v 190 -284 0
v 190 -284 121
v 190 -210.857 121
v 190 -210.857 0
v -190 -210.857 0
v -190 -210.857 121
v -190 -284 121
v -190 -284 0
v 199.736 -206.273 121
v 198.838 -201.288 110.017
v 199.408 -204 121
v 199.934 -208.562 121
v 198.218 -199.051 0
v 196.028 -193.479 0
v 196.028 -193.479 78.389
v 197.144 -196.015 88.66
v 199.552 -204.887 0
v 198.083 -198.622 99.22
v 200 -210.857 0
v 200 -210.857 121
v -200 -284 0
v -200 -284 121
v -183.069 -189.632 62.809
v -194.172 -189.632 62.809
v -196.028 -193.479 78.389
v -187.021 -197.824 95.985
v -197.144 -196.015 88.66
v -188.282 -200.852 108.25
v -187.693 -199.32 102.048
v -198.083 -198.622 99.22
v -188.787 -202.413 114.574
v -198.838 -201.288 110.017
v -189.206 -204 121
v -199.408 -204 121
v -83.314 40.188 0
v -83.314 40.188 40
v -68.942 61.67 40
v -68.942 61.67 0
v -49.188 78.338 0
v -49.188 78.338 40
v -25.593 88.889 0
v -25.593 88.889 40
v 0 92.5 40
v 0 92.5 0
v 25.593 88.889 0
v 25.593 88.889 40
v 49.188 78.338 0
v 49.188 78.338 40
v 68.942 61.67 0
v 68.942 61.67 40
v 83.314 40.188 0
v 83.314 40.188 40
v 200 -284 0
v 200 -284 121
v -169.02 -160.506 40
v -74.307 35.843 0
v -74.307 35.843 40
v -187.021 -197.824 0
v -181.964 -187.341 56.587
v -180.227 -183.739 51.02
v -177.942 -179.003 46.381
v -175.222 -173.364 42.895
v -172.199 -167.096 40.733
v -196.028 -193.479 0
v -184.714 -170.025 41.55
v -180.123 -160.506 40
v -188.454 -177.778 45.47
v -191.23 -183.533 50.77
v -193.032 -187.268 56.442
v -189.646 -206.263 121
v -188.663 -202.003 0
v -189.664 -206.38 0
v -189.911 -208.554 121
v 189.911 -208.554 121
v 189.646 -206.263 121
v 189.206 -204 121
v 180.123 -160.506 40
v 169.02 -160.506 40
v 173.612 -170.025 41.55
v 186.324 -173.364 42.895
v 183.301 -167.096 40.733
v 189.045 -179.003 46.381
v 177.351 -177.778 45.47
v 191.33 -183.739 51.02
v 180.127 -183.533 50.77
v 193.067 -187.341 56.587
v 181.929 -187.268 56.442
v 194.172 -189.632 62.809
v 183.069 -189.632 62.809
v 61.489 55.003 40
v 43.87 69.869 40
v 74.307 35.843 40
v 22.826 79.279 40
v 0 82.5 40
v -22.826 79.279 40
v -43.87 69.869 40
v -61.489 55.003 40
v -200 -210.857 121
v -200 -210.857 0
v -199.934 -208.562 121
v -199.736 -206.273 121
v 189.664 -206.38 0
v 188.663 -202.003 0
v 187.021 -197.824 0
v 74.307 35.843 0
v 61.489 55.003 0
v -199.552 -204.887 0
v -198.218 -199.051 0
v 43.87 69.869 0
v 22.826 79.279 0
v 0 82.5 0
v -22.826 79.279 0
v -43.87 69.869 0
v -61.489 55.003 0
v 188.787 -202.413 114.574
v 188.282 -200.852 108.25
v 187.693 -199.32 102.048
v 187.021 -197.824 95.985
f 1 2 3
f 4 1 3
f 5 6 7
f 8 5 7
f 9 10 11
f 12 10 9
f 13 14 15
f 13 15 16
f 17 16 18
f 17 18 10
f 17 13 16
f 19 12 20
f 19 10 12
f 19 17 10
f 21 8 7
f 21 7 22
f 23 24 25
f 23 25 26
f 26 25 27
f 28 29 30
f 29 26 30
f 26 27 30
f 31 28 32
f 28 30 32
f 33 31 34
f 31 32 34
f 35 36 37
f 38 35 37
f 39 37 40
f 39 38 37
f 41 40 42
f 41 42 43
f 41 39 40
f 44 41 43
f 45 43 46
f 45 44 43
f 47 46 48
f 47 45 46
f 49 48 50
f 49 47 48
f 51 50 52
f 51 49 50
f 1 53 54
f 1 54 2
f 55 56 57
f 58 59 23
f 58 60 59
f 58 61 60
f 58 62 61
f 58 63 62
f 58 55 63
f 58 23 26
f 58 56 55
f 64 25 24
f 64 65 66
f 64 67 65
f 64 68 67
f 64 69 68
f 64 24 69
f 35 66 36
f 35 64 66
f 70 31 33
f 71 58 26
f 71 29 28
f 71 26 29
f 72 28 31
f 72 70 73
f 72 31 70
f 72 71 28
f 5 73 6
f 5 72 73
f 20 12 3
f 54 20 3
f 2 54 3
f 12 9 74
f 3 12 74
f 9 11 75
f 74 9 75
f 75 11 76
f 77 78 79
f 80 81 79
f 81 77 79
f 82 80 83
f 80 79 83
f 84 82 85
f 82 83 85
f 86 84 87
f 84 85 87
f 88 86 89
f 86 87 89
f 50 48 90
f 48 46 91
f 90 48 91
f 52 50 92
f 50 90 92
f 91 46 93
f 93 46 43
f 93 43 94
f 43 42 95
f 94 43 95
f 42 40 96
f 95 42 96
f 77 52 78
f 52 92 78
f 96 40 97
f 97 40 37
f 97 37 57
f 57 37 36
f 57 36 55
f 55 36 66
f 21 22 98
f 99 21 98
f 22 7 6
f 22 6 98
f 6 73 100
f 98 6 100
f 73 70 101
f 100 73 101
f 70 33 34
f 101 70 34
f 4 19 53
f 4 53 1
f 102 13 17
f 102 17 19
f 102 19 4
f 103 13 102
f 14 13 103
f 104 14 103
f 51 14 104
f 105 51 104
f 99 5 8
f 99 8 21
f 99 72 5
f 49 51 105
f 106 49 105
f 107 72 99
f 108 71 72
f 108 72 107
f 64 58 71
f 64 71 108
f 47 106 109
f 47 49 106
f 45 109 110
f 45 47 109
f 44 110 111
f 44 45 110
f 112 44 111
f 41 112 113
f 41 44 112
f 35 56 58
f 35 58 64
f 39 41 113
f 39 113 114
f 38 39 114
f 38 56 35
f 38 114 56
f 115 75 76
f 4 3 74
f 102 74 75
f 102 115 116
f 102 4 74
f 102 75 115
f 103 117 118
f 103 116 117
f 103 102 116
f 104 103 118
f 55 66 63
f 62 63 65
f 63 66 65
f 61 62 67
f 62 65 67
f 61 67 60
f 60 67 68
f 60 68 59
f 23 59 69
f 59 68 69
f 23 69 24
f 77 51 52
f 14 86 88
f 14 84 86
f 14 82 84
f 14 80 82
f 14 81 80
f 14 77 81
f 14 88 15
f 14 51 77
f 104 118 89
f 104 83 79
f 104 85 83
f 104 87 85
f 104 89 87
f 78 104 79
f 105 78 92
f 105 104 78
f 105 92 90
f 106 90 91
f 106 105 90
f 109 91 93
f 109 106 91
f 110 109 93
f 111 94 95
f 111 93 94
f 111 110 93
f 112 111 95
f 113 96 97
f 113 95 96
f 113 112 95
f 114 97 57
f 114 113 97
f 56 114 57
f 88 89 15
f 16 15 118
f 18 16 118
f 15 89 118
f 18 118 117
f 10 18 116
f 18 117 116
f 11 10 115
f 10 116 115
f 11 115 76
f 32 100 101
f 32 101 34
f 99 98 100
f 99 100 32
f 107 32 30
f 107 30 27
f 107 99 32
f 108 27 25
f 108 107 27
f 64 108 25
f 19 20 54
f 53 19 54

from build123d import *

# Parameters (mm, degrees)
EXTRUDE_1_DEPTH     = 121
CUT_EXTRUDE_1_DEPTH = 506.269235161


with BuildPart() as part:
    # 草图1 → 凸台-拉伸1 (new body)
    with BuildSketch(Plane.XY):
        with BuildLine():
            Line((-190, -210.857487736), (-190, -284))
            Line((-190, -284), (-200, -284))
            Line((-200, -284), (-200, -210.857487736))
            ThreePointArc((-200, -210.857487736), (-198.994242885, -201.944069658), (-196.027548908, -193.478888262))
            Line((-196.027548908, -193.478888262), (-83.313706851, 40.188011282))
            ThreePointArc((-83.313706851, 40.188011282), (0, 92.5), (83.313706851, 40.188011282))
            Line((83.313706851, 40.188011282), (196.027548908, -193.478888262))
            ThreePointArc((196.027548908, -193.478888262), (198.994242885, -201.944069658), (200, -210.857487736))
            Line((200, -210.857487736), (200, -284))
            Line((200, -284), (190, -284))
            Line((190, -284), (190, -210.857487736))
            ThreePointArc((190, -210.857487736), (189.245682164, -204.172424177), (187.020661681, -197.82353813))
            Line((187.020661681, -197.82353813), (74.306819623, 35.843361414))
            ThreePointArc((74.306819623, 35.843361414), (0, 82.5), (-74.306819623, 35.843361414))
            Line((-74.306819623, 35.843361414), (-187.020661681, -197.82353813))
            ThreePointArc((-187.020661681, -197.82353813), (-189.245682164, -204.172424177), (-190, -210.857487736))
        make_face()
    extrude(amount=EXTRUDE_1_DEPTH)

    # 草图2 → 切除-拉伸1 (cut, through all)
    with BuildSketch(Plane.ZY.offset(200)):
        with BuildLine():
            Line((40, 92.5), (40, -160.506441654))
            ThreePointArc((40, -160.506441654), (46.380696587, -179.003157748), (62.808567085, -189.631744959))
            Line((62.808567085, -189.631744959), (121, -204))
            Line((121, -204), (121, 92.5))
            Line((121, 92.5), (40, 92.5))
        make_face()
    extrude(amount=-CUT_EXTRUDE_1_DEPTH, mode=Mode.SUBTRACT)


solid = part.part
